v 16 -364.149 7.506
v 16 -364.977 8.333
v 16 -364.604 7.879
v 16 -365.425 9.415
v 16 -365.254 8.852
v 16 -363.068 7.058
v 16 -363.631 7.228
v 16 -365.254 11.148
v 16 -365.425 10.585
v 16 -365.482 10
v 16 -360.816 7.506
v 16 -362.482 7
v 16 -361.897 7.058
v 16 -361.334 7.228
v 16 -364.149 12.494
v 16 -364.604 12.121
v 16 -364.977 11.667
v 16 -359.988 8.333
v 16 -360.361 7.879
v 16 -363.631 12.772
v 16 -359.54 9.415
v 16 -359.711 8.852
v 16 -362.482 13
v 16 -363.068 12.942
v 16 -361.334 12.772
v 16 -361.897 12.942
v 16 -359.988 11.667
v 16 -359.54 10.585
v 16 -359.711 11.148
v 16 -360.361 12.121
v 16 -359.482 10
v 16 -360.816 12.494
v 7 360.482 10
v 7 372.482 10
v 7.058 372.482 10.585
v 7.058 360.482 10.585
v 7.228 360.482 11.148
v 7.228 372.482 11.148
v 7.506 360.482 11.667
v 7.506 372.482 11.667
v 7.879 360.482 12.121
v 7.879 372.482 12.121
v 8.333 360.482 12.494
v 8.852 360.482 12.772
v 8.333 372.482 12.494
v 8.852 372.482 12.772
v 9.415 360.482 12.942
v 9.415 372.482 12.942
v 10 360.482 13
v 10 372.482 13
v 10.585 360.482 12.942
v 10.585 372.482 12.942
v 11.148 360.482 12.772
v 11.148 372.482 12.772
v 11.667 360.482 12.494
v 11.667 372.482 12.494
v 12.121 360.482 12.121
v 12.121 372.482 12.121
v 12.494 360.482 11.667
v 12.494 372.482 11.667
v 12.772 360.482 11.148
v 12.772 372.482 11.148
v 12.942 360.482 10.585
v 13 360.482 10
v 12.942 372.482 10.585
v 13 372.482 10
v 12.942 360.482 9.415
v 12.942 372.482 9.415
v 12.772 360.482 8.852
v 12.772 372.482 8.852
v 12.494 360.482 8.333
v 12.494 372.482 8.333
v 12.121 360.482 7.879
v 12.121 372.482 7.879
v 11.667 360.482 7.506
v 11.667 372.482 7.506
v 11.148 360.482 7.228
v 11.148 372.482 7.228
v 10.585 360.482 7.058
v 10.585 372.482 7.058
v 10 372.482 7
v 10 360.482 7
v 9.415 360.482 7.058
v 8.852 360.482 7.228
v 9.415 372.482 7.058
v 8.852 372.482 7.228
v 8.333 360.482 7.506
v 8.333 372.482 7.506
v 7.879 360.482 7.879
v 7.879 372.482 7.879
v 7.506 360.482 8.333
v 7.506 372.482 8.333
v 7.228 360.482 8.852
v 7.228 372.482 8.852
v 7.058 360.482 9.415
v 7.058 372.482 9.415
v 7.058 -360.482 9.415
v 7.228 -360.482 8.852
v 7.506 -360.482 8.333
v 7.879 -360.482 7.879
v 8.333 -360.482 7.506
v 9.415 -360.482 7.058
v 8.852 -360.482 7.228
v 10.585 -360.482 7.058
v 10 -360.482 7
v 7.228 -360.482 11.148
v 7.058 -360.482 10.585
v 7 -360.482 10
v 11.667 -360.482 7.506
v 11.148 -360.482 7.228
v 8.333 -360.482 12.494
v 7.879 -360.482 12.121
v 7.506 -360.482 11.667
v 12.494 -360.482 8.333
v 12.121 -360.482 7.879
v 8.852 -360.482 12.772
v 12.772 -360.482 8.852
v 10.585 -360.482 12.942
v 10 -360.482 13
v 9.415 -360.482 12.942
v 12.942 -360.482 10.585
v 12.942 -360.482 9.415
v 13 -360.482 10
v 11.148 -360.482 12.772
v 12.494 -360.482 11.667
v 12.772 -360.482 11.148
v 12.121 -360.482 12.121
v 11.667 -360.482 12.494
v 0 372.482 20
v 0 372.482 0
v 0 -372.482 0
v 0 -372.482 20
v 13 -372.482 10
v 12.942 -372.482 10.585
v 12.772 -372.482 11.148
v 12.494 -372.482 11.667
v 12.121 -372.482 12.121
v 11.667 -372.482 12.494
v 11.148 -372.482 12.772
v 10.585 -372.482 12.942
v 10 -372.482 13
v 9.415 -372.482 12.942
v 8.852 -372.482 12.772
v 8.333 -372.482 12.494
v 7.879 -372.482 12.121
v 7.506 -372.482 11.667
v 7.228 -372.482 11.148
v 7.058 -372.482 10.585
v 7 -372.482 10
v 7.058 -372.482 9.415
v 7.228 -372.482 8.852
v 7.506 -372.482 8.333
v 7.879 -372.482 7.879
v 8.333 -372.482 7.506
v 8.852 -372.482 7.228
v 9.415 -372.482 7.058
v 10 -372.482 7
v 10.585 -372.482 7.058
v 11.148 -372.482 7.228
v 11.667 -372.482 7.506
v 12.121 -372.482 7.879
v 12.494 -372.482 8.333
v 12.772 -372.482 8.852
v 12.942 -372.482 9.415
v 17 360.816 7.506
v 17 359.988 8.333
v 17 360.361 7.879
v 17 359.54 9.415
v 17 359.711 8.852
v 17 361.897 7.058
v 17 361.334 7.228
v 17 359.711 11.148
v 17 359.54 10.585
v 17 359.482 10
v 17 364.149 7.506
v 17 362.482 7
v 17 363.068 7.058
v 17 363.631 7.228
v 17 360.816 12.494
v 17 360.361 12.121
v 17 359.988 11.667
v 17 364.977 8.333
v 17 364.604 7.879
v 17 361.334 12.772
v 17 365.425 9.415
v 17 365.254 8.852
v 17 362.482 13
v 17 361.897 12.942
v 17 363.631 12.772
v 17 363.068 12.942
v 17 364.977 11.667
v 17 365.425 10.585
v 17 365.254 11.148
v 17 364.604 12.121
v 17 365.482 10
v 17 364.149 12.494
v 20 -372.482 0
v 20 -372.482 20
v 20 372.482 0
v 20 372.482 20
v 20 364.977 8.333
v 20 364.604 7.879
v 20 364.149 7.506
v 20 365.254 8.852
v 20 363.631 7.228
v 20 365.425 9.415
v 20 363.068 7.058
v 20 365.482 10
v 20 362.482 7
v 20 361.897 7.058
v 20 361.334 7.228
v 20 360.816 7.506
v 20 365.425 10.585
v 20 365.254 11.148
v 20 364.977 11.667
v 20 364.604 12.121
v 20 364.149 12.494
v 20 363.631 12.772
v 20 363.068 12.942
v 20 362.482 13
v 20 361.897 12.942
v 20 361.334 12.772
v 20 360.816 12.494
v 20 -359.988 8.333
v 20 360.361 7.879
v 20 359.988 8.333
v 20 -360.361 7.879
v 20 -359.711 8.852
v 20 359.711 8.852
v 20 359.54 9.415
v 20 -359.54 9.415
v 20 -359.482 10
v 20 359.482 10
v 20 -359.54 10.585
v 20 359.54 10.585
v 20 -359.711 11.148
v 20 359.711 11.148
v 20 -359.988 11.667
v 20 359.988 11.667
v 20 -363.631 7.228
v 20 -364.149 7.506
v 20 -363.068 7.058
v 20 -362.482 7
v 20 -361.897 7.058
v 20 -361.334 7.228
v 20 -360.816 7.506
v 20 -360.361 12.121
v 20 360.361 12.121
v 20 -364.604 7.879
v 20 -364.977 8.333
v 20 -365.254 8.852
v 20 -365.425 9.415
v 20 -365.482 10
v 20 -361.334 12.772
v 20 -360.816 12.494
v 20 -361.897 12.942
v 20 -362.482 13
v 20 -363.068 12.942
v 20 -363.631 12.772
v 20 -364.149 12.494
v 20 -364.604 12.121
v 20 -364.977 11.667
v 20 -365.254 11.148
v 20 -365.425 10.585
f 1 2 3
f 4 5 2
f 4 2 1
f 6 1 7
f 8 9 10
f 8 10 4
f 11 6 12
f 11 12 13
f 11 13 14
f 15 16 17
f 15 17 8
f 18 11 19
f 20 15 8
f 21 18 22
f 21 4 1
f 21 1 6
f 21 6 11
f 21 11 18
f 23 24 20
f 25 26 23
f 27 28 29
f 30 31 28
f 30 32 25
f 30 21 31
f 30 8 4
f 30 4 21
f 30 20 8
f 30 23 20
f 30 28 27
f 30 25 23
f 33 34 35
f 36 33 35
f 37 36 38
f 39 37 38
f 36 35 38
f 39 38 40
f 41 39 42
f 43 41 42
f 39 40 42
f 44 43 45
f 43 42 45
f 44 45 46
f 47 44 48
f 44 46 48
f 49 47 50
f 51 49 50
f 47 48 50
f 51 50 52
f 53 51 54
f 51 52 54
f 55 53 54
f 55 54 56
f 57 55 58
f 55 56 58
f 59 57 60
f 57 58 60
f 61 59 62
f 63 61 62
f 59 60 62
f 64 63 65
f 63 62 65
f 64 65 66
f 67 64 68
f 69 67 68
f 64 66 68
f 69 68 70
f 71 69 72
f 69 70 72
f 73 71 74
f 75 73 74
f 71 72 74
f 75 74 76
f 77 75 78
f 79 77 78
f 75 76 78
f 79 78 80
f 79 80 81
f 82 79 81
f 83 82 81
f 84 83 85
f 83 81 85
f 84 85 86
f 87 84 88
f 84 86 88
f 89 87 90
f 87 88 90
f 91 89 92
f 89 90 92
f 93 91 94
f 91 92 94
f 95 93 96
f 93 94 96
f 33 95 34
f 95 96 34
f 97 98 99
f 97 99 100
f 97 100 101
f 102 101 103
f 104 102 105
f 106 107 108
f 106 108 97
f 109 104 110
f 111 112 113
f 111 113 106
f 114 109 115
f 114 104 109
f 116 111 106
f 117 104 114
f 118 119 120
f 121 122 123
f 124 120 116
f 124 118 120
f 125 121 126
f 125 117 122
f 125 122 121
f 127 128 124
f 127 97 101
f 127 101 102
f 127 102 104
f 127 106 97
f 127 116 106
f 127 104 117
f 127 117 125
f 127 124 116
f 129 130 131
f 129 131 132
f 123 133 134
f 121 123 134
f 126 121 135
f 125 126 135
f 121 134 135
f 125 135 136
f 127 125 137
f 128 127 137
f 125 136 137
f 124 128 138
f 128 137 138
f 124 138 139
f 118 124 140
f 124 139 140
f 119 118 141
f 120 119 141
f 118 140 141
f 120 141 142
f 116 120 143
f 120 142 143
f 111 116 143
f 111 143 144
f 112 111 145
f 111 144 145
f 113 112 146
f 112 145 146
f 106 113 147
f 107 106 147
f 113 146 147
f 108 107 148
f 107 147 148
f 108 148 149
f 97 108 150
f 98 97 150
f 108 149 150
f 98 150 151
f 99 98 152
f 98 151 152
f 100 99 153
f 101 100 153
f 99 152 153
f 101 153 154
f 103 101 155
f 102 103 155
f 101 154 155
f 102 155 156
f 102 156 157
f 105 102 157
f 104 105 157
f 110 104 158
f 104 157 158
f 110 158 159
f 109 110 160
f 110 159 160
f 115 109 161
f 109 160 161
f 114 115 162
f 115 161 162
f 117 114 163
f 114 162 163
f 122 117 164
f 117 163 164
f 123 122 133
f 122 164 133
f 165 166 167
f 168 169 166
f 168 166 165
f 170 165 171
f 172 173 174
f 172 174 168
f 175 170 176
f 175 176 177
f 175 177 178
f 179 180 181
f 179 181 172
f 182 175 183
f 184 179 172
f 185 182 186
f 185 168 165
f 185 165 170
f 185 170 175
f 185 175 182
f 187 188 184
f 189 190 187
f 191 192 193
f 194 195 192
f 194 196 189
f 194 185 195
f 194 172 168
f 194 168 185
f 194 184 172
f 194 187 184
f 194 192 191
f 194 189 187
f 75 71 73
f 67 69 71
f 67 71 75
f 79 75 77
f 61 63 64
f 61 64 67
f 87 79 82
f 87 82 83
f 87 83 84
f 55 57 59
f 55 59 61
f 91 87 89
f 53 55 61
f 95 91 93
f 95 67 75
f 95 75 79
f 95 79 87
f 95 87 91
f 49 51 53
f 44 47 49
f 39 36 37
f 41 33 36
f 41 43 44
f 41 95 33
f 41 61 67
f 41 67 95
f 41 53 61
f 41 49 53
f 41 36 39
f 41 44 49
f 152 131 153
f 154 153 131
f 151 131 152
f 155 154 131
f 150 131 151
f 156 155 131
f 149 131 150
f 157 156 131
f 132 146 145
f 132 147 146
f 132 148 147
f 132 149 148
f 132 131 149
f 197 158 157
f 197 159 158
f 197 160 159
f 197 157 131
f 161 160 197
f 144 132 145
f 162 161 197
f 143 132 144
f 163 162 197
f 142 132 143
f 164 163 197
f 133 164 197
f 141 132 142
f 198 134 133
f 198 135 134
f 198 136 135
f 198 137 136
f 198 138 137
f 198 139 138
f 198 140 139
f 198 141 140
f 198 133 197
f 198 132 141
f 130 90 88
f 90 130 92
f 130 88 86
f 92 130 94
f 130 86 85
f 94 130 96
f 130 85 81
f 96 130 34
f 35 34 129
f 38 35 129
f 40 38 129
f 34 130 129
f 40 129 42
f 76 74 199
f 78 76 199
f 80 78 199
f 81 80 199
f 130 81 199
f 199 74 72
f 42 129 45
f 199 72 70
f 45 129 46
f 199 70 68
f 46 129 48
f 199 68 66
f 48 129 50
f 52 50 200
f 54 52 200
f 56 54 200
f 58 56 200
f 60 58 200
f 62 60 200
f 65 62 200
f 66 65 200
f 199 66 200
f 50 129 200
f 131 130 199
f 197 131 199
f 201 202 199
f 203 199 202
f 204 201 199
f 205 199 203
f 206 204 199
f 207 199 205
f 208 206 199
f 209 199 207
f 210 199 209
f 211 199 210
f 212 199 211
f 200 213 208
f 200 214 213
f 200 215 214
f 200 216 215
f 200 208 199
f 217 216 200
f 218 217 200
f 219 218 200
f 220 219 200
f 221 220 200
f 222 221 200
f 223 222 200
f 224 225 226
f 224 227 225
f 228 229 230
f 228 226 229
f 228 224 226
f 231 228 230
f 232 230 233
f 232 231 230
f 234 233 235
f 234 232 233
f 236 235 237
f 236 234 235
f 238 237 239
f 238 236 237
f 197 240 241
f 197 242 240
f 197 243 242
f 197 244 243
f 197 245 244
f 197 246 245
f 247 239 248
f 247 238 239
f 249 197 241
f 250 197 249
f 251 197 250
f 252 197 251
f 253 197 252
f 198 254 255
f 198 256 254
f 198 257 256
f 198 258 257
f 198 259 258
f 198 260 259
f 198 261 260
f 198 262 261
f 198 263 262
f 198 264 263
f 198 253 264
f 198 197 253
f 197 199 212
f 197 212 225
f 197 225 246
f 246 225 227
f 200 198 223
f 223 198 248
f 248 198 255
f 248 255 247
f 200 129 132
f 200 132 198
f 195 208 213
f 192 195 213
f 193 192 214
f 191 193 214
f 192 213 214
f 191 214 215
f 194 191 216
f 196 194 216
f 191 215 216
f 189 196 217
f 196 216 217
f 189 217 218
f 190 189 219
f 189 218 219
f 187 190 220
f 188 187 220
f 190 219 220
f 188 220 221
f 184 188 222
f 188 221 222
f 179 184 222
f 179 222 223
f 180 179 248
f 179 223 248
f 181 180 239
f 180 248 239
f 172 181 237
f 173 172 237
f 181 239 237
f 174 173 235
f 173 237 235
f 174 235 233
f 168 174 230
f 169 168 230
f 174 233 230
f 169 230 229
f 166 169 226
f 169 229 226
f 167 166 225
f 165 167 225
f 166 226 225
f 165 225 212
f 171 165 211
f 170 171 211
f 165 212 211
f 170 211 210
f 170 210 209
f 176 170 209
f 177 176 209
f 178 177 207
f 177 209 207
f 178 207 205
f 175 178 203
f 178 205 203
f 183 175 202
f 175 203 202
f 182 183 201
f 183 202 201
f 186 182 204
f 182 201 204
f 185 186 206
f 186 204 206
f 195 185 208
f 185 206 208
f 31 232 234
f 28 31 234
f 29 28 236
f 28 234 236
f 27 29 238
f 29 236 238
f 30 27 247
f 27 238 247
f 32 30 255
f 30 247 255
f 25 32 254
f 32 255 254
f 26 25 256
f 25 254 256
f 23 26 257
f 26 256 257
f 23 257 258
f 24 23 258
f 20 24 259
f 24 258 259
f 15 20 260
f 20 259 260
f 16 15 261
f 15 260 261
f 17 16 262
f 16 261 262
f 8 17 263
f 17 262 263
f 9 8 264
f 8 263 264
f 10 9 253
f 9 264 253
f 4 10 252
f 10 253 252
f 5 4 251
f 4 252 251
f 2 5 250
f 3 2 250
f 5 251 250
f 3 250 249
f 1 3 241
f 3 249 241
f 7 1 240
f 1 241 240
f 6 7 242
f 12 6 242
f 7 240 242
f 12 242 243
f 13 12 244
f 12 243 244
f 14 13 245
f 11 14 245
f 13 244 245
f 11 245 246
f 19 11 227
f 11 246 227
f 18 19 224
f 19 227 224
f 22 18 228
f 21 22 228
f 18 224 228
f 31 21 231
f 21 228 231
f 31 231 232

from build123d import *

# Parameters (mm, degrees)
F0_W     = 20
F0_H     = 20
F1_DEPTH = 372.4825
F2_R     = 3
F3_DEPTH = 12
F4_R     = 3
F5_DEPTH = 12
F6_R     = 3
F7_DEPTH = 3
F8_R     = 3
F9_DEPTH = 4


with BuildPart() as f1:
    # F0 (on Front) → F1 (new body, symmetric)
    with BuildSketch(Plane.XZ):
        with Locations((10, 10)):
            Rectangle(F0_W, F0_H)
    extrude(amount=F1_DEPTH, both=True)

    # F2 (on face) → F3 (cut)
    with BuildSketch(Plane.XZ.offset(372.4825)):
        with Locations((10, 10)):
            Circle(F2_R)
    extrude(amount=-F3_DEPTH, mode=Mode.SUBTRACT)

    # F4 (on face) → F5 (cut)
    with BuildSketch(Plane(origin=(0, 372.4825, 0), x_dir=(-1, 0, 0), z_dir=(0, 1, 0))):
        with Locations((-10, 10)):
            Circle(F4_R)
    extrude(amount=-F5_DEPTH, mode=Mode.SUBTRACT)

    # F6 (on face) → F7 (cut)
    with BuildSketch(Plane.YZ.offset(20)):
        with Locations((362.4825, 10)):
            Circle(F6_R)
    extrude(amount=-F7_DEPTH, mode=Mode.SUBTRACT)

    # F8 (on face) → F9 (cut)
    with BuildSketch(Plane.YZ.offset(20)):
        with Locations((-362.4825, 10)):
            Circle(F8_R)
    extrude(amount=-F9_DEPTH, mode=Mode.SUBTRACT)


solid = f1.part
